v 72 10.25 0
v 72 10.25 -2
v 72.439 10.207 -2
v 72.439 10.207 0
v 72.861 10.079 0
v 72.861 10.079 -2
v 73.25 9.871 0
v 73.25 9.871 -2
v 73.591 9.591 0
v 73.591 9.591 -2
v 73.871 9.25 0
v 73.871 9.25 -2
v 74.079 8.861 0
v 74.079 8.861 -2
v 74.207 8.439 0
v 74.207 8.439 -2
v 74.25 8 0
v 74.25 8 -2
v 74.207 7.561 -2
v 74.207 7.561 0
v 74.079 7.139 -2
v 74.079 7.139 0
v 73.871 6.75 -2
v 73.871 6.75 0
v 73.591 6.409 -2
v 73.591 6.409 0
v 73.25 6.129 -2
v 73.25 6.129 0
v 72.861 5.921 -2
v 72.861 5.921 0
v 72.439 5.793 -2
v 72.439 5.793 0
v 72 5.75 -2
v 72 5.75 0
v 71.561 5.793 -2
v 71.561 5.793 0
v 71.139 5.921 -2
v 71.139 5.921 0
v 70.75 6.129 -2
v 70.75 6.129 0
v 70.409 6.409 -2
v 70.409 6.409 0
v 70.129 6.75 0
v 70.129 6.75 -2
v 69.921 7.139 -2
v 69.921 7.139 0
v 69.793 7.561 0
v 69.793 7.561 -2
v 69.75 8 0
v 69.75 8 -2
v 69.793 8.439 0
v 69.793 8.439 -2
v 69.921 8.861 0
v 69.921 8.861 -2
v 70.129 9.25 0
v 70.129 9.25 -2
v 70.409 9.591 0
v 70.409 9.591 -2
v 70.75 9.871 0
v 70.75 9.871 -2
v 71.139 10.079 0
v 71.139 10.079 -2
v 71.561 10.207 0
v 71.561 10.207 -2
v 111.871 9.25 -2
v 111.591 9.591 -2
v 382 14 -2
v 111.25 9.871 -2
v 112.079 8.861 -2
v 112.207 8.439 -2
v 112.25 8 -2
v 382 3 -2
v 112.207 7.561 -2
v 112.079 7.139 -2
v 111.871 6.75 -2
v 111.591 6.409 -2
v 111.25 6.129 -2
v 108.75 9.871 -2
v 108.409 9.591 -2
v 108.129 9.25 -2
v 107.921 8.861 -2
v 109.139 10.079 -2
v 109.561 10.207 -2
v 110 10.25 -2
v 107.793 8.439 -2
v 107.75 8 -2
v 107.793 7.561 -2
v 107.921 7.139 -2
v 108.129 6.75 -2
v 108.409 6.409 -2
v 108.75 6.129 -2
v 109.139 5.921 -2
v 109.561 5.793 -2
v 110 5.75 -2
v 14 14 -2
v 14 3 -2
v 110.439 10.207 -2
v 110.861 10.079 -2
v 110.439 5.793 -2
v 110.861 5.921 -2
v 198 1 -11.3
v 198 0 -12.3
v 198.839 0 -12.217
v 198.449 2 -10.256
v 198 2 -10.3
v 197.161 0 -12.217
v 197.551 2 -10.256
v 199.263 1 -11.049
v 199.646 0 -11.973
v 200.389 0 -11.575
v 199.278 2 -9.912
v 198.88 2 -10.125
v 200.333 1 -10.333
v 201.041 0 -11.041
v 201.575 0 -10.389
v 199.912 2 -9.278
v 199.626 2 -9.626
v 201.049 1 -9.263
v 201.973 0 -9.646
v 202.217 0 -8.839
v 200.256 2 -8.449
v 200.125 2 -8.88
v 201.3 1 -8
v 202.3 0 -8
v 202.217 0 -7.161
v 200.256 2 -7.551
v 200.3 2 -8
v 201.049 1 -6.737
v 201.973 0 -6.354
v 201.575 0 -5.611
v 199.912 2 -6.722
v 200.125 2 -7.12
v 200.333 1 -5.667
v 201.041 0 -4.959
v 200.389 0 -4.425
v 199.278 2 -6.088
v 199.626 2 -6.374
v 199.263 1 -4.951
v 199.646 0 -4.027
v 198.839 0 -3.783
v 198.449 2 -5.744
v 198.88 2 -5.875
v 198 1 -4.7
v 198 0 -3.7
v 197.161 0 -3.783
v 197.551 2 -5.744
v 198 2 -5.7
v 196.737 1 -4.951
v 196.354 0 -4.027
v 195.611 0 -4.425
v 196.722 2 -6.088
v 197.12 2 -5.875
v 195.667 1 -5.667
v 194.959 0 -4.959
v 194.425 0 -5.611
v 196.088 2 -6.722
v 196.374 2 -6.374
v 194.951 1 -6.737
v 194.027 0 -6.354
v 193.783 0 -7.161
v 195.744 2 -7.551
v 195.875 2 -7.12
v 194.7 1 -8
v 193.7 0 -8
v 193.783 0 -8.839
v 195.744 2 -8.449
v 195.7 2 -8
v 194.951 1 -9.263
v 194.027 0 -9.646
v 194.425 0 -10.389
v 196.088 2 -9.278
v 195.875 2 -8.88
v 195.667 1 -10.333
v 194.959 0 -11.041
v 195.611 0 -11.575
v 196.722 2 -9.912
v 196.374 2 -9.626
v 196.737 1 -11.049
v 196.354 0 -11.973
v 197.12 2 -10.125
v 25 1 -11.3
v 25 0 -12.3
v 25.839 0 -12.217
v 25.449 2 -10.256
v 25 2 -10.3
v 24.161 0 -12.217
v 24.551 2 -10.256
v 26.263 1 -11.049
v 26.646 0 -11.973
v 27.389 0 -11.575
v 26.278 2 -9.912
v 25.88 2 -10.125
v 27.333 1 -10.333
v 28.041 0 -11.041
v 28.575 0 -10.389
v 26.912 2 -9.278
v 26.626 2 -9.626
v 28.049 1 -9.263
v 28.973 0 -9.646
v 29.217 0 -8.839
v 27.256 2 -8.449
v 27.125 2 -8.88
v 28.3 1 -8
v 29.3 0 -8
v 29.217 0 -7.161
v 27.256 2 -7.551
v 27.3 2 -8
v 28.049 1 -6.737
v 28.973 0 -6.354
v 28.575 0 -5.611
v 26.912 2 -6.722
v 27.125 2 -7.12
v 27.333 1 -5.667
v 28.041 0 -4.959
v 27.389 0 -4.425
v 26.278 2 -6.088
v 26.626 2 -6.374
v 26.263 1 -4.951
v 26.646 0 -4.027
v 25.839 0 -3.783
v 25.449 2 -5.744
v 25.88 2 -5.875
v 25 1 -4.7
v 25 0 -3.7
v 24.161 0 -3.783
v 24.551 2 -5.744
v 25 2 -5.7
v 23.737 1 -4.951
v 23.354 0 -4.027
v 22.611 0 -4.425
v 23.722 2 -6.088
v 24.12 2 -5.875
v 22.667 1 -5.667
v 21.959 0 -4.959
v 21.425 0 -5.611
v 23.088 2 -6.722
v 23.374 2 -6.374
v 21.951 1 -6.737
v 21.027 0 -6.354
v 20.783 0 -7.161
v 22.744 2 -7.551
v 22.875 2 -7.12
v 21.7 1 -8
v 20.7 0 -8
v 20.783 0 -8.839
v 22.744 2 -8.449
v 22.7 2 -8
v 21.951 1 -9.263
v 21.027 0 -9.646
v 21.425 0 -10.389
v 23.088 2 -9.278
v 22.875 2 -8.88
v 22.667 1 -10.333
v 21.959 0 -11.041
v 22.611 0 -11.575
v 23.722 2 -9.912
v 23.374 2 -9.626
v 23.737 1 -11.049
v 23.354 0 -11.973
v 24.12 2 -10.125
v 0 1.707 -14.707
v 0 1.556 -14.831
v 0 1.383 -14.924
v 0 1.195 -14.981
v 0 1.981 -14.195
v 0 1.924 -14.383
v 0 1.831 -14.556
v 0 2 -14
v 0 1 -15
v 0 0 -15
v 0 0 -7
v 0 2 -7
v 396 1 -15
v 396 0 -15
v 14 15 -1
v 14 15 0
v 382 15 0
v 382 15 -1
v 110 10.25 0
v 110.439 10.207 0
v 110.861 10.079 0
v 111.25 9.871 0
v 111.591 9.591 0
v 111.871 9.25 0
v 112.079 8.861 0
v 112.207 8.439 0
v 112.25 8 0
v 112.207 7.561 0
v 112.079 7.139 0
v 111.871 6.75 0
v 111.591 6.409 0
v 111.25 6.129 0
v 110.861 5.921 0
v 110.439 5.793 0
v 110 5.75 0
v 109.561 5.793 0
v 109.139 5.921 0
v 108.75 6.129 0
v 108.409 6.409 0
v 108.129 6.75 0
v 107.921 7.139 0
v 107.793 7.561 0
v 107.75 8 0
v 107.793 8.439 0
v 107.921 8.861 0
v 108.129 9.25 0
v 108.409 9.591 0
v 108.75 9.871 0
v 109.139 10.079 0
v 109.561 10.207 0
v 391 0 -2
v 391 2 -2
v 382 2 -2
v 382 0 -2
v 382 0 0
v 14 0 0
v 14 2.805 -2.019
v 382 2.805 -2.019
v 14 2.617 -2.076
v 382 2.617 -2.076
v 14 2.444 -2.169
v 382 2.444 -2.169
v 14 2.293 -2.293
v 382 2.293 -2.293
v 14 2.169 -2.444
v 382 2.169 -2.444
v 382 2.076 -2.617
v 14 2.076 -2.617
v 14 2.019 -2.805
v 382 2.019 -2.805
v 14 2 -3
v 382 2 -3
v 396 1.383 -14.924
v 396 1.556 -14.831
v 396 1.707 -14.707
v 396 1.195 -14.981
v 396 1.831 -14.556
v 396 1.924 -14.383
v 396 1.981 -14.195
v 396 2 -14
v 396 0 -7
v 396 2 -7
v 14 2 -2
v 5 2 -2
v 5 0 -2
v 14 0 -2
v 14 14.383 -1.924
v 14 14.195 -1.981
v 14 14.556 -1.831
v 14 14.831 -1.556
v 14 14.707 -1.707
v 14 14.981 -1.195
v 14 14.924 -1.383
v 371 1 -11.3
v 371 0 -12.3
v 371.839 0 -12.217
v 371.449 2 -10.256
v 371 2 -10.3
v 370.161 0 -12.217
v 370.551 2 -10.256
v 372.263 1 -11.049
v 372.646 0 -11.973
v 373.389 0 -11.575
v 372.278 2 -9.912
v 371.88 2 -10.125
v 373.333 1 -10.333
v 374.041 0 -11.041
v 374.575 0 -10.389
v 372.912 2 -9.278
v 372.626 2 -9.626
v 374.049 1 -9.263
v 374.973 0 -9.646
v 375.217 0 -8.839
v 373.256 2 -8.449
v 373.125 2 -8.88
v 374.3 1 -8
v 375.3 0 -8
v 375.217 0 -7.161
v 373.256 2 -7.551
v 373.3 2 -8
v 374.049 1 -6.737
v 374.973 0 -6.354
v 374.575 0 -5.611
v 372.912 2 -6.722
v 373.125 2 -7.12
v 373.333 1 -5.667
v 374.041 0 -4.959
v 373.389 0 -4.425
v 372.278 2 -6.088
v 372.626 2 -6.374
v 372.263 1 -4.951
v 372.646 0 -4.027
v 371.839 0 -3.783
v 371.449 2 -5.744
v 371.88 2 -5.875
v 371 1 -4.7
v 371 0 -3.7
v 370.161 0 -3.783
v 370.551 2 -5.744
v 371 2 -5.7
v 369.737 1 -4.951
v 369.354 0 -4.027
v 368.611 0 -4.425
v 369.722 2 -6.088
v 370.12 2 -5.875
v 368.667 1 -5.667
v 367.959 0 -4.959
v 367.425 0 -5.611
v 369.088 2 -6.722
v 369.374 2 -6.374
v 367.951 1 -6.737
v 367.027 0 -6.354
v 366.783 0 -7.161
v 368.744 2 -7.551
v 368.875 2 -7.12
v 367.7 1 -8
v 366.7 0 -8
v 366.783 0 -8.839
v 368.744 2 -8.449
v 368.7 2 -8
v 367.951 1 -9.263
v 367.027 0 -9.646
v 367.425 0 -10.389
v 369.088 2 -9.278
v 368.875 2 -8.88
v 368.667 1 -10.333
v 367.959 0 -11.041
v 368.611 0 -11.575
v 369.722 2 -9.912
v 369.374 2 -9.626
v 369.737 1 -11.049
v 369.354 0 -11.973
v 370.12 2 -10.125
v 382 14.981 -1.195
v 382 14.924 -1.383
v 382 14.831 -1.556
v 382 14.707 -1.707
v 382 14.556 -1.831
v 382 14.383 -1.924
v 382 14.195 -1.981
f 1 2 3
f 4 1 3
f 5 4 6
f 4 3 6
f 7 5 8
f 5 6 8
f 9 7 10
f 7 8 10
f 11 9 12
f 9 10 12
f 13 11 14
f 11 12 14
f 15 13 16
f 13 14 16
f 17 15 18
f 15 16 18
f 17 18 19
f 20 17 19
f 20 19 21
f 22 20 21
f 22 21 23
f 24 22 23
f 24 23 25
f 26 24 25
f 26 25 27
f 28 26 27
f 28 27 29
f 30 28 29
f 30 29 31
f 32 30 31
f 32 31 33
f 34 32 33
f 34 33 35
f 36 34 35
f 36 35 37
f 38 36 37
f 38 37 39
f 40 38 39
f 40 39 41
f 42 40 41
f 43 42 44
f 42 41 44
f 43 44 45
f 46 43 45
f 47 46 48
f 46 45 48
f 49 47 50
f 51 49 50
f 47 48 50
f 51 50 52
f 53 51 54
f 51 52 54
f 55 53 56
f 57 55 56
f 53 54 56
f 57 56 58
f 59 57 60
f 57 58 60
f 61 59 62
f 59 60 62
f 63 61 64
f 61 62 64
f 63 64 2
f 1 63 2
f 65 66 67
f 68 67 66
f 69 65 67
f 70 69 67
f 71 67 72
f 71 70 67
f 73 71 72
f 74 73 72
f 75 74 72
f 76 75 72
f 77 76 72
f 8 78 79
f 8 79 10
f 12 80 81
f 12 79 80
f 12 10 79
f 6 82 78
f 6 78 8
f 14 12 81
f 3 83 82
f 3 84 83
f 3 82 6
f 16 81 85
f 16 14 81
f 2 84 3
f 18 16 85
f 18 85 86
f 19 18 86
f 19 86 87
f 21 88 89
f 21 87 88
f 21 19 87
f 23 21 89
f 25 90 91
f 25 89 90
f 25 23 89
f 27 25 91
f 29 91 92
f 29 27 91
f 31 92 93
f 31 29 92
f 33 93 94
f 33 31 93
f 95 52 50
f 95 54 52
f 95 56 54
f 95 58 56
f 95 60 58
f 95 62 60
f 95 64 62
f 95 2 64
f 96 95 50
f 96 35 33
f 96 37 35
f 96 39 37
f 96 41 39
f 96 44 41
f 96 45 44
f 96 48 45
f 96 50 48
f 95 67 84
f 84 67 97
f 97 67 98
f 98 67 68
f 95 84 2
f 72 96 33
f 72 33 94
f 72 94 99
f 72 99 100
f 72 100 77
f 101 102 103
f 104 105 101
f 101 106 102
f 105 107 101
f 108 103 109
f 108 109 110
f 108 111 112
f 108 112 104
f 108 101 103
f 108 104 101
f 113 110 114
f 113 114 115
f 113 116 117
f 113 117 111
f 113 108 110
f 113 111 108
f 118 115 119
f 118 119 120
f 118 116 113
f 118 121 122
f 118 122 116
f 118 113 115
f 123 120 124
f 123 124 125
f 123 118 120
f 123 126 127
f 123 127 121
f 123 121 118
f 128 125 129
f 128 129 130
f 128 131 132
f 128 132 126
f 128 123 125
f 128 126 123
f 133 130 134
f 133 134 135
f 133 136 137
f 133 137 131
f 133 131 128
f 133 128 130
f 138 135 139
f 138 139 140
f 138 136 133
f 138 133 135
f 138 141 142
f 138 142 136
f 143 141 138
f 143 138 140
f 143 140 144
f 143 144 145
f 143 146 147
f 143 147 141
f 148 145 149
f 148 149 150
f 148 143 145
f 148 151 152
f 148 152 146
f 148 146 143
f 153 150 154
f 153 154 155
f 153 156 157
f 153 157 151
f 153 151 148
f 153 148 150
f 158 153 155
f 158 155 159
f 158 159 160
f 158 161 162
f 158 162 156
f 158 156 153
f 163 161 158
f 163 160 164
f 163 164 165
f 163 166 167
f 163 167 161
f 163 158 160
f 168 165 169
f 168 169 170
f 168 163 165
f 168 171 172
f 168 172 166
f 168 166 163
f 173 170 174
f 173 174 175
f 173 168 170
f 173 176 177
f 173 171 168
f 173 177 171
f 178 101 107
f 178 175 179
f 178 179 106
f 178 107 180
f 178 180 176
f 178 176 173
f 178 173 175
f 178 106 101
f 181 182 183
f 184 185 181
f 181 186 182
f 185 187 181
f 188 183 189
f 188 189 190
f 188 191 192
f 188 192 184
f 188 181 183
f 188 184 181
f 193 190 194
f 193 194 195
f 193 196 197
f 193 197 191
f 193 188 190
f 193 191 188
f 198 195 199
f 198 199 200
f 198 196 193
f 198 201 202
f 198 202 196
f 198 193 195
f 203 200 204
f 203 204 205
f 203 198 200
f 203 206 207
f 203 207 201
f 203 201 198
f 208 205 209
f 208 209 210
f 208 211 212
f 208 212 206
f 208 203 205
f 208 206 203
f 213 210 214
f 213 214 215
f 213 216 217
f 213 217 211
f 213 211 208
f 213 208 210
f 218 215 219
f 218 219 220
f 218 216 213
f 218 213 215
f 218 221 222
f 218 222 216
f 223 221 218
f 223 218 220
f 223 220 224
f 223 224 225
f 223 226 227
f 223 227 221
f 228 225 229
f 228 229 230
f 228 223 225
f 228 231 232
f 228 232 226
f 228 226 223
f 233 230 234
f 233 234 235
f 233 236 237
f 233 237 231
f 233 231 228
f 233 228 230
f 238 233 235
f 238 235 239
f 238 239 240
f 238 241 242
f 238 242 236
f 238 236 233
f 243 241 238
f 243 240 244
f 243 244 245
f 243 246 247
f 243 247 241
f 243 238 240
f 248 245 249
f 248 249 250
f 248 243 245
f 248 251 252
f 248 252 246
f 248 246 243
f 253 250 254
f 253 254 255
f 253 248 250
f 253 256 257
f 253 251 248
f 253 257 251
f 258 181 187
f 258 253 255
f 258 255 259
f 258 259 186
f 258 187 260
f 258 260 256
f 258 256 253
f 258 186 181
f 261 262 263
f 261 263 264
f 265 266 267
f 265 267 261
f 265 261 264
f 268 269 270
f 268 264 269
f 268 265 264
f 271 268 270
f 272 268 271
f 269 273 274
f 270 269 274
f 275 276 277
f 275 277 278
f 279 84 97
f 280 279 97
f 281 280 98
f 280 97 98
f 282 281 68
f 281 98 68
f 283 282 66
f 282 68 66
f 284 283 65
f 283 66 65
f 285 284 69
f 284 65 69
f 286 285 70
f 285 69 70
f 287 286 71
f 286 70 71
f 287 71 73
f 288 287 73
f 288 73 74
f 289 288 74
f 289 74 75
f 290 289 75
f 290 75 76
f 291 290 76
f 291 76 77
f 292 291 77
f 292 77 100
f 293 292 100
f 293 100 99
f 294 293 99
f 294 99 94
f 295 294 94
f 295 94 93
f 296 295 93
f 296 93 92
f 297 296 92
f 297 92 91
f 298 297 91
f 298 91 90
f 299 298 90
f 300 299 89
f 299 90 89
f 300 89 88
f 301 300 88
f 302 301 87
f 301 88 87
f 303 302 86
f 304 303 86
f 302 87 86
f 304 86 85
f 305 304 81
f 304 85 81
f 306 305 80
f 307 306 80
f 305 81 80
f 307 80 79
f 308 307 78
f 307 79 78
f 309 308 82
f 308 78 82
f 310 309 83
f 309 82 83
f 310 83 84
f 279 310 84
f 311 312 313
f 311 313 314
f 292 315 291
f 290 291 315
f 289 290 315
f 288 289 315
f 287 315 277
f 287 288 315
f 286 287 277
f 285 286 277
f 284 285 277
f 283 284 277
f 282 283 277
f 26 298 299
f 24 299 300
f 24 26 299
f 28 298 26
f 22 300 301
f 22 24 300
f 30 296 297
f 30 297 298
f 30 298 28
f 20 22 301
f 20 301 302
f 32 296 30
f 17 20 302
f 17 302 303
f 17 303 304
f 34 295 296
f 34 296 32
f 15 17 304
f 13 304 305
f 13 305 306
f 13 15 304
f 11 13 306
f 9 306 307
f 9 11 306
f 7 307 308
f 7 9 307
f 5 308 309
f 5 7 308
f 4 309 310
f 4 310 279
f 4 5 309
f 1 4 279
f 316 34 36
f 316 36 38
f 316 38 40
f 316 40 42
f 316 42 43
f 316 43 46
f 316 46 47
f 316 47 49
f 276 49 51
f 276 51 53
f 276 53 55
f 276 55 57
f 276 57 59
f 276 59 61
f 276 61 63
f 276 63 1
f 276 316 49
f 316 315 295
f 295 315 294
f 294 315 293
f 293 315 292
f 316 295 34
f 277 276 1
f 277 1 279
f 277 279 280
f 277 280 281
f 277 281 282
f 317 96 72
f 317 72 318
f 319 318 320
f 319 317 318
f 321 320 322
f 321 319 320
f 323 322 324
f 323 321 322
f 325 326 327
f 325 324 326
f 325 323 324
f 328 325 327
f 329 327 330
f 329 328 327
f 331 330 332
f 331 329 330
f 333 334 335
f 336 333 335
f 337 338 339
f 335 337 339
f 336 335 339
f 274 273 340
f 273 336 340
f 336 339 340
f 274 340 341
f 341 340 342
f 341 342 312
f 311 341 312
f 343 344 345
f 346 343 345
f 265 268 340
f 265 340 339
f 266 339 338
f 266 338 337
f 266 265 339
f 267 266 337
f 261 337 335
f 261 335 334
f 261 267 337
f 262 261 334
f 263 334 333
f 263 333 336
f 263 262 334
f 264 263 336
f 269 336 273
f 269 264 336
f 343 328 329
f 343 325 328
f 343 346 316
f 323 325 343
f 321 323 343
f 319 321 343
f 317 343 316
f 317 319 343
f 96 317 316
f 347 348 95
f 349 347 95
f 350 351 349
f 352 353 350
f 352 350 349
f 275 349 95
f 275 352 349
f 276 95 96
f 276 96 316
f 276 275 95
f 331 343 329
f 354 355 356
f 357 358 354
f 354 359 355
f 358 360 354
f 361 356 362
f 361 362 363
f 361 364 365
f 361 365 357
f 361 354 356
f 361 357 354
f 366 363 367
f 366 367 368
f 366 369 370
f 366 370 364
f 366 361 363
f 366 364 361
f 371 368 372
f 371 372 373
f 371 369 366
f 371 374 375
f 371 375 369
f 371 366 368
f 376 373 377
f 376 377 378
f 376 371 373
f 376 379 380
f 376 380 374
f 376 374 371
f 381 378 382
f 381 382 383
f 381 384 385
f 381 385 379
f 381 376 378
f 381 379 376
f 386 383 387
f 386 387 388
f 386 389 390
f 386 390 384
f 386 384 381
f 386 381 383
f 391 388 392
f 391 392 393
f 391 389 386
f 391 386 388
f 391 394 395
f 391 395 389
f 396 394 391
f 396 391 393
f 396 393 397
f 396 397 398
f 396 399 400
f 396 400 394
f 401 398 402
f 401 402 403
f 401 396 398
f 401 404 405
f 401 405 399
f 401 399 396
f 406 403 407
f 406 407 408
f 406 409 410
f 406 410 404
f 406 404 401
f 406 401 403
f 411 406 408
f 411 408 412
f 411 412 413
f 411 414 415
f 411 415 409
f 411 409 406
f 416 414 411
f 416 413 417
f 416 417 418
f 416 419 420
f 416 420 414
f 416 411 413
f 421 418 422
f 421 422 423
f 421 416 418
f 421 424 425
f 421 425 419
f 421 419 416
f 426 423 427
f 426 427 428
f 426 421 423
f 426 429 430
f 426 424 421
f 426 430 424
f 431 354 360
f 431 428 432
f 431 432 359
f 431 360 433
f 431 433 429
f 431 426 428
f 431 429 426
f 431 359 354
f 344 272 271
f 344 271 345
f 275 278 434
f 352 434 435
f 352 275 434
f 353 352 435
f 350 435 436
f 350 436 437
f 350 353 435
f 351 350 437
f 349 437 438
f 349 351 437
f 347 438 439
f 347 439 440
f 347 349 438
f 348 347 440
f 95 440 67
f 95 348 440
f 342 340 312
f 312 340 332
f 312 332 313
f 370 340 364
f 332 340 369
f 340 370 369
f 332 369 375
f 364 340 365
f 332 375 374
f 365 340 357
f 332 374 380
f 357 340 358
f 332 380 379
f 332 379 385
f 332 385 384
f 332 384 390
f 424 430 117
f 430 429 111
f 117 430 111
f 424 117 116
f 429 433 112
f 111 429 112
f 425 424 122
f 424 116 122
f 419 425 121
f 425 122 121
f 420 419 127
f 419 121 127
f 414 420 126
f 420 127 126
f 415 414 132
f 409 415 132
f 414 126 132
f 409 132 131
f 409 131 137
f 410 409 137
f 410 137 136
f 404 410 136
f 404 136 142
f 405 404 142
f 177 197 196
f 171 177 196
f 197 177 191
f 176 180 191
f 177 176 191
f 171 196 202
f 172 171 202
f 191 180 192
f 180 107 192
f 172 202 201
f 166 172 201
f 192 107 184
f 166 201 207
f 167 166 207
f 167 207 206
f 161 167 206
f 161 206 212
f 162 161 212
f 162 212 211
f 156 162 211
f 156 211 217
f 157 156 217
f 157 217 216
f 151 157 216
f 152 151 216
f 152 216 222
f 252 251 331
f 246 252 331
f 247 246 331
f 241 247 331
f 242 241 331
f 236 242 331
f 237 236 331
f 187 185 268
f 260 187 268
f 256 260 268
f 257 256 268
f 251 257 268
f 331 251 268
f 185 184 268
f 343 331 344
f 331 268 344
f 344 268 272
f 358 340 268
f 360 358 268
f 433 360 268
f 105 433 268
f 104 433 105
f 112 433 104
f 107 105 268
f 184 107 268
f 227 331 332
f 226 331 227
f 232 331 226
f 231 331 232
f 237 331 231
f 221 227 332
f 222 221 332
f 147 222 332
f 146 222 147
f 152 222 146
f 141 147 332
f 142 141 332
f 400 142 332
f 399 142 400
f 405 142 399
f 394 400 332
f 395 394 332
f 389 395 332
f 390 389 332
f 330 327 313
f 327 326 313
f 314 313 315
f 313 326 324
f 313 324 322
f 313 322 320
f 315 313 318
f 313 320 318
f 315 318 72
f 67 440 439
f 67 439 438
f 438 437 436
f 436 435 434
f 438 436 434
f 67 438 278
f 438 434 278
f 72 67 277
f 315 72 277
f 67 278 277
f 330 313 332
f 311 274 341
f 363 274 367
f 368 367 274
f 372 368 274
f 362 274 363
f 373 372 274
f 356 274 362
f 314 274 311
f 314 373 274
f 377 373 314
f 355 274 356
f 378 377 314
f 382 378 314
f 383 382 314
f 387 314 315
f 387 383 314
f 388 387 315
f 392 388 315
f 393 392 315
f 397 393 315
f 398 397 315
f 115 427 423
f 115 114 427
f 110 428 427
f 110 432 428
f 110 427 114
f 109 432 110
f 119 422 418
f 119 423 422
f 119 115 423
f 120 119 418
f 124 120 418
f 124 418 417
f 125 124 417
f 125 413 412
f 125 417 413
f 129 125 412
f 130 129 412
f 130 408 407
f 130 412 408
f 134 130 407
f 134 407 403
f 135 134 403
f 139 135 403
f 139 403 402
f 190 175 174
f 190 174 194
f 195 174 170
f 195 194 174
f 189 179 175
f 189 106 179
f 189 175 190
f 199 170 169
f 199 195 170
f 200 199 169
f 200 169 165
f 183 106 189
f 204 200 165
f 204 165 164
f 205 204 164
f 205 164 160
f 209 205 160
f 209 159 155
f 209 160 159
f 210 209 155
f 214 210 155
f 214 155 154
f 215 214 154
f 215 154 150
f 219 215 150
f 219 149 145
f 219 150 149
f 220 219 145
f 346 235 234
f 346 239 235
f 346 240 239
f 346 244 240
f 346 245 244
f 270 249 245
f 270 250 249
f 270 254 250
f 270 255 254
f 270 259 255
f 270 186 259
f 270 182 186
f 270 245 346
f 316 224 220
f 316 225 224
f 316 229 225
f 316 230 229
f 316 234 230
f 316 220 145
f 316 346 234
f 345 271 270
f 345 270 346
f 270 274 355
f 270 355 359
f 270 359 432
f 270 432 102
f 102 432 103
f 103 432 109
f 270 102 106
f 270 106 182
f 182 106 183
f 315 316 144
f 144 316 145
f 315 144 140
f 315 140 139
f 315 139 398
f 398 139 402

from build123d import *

# Parameters (mm, degrees)
EXTRUDE_1_DEPTH     = 396
SKETCH_4_R          = 2.25
CUT_EXTRUDE_3_DEPTH = 2
CHAMFER_1_SIZE      = 2.05
CUT_EXTRUDE_5_DEPTH = 14
CUT_EXTRUDE_6_DEPTH = 14
CUT_EXTRUDE_7_DEPTH = 397.497162663
SKETCH_10_R         = 2.25
CUT_EXTRUDE_8_DEPTH = 397.497162663


with BuildPart() as part:
    # Эскиз1 → Бобышка-Вытянуть1 (new body)
    with BuildSketch(Plane(origin=(0, 0, 0), x_dir=(0, 0, -1), z_dir=(1, 0, 0))):
        with BuildLine():
            Line((0, 0), (0, 15))
            Line((0, 15), (1, 15))
            ThreePointArc((1, 15), (1.707106781, 14.707106781), (2, 14))
            Line((2, 14), (2, 3))
            ThreePointArc((2, 3), (2.292893219, 2.292893219), (3, 2))
            Line((3, 2), (14, 2))
            ThreePointArc((14, 2), (14.707106781, 1.707106781), (15, 1))
            Line((15, 1), (15, 0))
            Line((15, 0), (0, 0))
        make_face()
    extrude(amount=EXTRUDE_1_DEPTH)

    # Эскиз4 → Вырез-Вытянуть3 (cut)
    with BuildSketch(Plane.XZ):
        with Locations(Location((371, -8, 0), (0, 0, 270))):
            Circle(SKETCH_4_R)
        with Locations(Location((198, -8, 0), (0, 0, 270))):
            Circle(SKETCH_4_R)
        with Locations(Location((25, -8, 0), (0, 0, 270))):
            Circle(SKETCH_4_R)
    extrude(amount=-CUT_EXTRUDE_3_DEPTH, mode=Mode.SUBTRACT)

    # Фаска1
    # the kernel refuses this chamfer: 2.05 mm, written as the material it takes off along each edge
    with BuildSketch(Plane(origin=(25, 0, -8), x_dir=(0, 0, -1), z_dir=(-1, 0, 0))) as chamfer_1_piece_1:
        Polygon((2.25 + CHAMFER_1_SIZE, 0), (2.25, -CHAMFER_1_SIZE), (2.25, 0), align=None)
    revolve(axis=Axis((25, 0, -8), (0, -1, 0)), mode=Mode.SUBTRACT)
    with BuildSketch(Plane(origin=(371, 0, -8), x_dir=(0, 0, -1), z_dir=(-1, 0, 0))) as chamfer_1_piece_2:
        Polygon((2.25 + CHAMFER_1_SIZE, 0), (2.25, -CHAMFER_1_SIZE), (2.25, 0), align=None)
    revolve(axis=Axis((371, 0, -8), (0, -1, 0)), mode=Mode.SUBTRACT)
    with BuildSketch(Plane(origin=(198, 0, -8), x_dir=(0, 0, -1), z_dir=(-1, 0, 0))) as chamfer_1_piece_3:
        Polygon((2.25 + CHAMFER_1_SIZE, 0), (2.25, -CHAMFER_1_SIZE), (2.25, 0), align=None)
    revolve(axis=Axis((198, 0, -8), (0, -1, 0)), mode=Mode.SUBTRACT)

    # Эскиз6 → Вырез-Вытянуть5 (cut)
    with BuildSketch(Plane(origin=(396, 0, 0), x_dir=(0, 0, -1), z_dir=(1, 0, 0))):
        Polygon((0, 15), (2, 15), (3, 15), (3, 2), (2, 2), (2, 0), (0, 0), align=None)
    extrude(amount=-CUT_EXTRUDE_5_DEPTH, mode=Mode.SUBTRACT)

    # Эскиз7 → Вырез-Вытянуть6 (cut)
    with BuildSketch(Plane.ZY):
        Polygon((0, 15), (-2, 15), (-3, 15), (-3, 2), (-2, 2), (-2, 0), (0, 0), align=None)
    extrude(amount=-CUT_EXTRUDE_6_DEPTH, mode=Mode.SUBTRACT)

    # Эскиз9 → Вырез-Вытянуть7 (cut, through all)
    with BuildSketch(Plane(origin=(0, 2, 0), x_dir=(1, 0, 0), z_dir=(0, 1, 0))):
        Polygon((0, 2), (0, 7), (5, 2), align=None)
        Polygon((396, 2), (396, 7), (391, 2), align=None)
    extrude(amount=-CUT_EXTRUDE_7_DEPTH, mode=Mode.SUBTRACT)

    # Эскиз10 → Вырез-Вытянуть8 (cut, through all)
    with BuildSketch(Plane(origin=(0, 0, -2), x_dir=(-1, 0, 0), z_dir=(0, 0, -1))):
        with Locations(Location((-72, 8, 0), (0, 0, 90))):
            Circle(SKETCH_10_R)
        with Locations(Location((-110, 8, 0), (0, 0, 90))):
            Circle(SKETCH_10_R)
    extrude(amount=-CUT_EXTRUDE_8_DEPTH, mode=Mode.SUBTRACT)


solid = part.part
